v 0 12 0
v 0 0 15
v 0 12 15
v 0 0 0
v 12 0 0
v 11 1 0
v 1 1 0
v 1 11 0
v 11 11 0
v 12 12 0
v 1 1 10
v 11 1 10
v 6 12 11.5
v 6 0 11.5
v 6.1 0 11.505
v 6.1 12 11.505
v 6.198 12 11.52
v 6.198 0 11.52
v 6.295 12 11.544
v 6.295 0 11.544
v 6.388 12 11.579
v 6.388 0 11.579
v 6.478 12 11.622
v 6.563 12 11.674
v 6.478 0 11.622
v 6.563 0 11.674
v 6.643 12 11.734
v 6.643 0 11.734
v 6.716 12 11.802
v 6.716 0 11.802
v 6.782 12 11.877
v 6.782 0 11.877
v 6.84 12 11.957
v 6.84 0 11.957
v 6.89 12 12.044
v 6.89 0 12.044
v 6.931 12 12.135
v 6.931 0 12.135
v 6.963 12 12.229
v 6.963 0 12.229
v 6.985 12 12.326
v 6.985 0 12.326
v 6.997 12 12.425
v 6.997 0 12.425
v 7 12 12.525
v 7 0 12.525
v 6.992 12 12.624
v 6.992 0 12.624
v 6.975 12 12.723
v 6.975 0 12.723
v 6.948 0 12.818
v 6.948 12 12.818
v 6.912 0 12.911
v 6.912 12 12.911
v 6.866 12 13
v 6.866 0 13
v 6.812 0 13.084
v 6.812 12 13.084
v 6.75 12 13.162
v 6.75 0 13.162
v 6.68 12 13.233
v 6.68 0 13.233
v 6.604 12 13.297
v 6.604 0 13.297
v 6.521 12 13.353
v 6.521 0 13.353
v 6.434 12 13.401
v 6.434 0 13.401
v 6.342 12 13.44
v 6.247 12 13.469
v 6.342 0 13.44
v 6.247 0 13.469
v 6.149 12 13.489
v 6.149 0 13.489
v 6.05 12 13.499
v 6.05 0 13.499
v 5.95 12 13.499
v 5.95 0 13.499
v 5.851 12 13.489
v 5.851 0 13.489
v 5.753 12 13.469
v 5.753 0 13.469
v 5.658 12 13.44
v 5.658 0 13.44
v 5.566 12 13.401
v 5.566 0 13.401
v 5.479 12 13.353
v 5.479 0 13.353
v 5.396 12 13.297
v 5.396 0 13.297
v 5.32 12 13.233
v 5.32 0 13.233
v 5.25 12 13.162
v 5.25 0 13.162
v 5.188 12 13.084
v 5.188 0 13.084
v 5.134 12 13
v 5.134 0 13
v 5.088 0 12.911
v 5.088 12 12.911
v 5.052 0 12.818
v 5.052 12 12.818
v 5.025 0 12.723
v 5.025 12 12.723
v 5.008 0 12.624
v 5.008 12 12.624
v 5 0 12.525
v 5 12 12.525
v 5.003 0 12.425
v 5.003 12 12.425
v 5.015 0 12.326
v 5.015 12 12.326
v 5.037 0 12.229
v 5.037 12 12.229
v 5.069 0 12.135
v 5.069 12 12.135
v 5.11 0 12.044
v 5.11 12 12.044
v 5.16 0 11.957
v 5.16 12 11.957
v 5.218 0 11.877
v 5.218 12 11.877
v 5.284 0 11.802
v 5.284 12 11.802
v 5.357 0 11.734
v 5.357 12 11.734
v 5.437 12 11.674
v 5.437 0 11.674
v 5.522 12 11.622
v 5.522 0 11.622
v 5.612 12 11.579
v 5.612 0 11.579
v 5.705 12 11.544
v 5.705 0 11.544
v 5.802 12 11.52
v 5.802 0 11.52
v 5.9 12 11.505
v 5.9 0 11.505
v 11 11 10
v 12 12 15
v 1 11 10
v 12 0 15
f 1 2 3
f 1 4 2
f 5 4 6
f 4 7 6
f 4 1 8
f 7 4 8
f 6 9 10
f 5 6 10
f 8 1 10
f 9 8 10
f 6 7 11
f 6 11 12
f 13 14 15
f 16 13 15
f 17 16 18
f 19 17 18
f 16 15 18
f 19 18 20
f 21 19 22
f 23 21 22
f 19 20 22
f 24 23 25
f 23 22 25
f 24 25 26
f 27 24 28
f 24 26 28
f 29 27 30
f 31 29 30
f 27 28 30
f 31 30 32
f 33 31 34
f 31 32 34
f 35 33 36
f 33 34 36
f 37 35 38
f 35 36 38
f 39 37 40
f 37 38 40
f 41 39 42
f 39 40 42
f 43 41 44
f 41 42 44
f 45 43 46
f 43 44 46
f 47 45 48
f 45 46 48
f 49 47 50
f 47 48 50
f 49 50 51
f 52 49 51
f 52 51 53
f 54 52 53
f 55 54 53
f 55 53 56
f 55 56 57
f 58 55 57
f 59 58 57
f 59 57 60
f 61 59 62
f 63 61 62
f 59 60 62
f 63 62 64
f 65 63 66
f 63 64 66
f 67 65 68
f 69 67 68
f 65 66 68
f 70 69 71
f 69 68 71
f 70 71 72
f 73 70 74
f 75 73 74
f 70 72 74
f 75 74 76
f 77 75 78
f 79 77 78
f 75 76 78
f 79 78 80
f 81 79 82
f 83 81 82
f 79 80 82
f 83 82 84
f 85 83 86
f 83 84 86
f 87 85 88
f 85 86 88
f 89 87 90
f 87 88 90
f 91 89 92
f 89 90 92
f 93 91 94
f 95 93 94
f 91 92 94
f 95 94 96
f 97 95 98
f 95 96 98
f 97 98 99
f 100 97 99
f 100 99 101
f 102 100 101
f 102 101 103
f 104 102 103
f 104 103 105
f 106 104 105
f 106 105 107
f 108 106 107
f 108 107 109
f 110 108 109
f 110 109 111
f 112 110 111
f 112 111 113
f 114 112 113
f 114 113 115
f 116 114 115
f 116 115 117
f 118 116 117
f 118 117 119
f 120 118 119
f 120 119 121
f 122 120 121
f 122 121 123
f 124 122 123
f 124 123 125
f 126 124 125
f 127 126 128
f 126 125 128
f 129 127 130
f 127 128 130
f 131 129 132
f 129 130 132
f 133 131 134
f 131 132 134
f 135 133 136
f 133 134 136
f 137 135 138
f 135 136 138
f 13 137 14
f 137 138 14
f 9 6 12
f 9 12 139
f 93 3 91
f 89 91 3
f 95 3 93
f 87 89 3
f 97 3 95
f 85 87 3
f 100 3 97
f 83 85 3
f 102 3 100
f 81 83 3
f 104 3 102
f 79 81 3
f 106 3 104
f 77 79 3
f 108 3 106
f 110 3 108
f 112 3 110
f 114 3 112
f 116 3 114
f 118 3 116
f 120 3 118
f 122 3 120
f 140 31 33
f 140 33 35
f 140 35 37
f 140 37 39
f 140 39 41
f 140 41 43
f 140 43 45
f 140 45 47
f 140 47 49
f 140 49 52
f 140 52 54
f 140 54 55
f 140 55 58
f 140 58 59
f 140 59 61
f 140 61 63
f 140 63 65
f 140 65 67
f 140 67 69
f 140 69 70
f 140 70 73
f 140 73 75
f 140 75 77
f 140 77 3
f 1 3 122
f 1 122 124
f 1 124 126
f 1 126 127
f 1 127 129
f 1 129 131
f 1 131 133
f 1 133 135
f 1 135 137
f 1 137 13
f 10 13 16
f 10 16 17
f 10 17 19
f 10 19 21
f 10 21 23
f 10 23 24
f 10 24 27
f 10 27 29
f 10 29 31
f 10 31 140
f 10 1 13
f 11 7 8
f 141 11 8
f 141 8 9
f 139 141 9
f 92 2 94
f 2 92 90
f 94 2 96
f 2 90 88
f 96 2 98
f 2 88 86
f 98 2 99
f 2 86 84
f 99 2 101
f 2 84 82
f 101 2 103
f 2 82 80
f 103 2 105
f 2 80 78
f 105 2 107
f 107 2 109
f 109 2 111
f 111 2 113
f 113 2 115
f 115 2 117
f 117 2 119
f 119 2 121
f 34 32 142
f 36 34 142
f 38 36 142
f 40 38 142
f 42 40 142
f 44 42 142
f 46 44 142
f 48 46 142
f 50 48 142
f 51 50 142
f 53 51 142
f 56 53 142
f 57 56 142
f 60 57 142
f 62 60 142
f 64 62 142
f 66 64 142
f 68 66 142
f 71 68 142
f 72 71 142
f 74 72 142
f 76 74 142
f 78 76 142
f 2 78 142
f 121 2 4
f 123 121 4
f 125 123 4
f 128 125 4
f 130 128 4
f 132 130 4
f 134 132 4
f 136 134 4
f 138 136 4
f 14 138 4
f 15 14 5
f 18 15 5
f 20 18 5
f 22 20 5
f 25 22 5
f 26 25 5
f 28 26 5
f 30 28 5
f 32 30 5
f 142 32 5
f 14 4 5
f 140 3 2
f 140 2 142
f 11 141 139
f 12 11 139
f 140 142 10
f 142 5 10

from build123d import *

# Parameters (mm, degrees)
SKETCH_1_W          = 12
SKETCH_1_H          = 12
SKETCH_1_W_2        = 10
SKETCH_1_H_2        = 10
EXTRUDE_1_DEPTH     = 10
SKETCH_2_W          = 12
SKETCH_2_H          = 12
EXTRUDE_2_DEPTH     = 5
SKETCH_3_R          = 1
CUT_EXTRUDE_3_DEPTH = 12


with BuildPart() as part:
    # 草图1 → 凸台-拉伸1 (new body)
    with BuildSketch(Plane.XY):
        with Locations((6, 6)):
            Rectangle(SKETCH_1_W, SKETCH_1_H)
        with Locations((6, 6)):
            Rectangle(SKETCH_1_W_2, SKETCH_1_H_2, mode=Mode.SUBTRACT)
    extrude(amount=EXTRUDE_1_DEPTH)

    # 草图2 → 凸台-拉伸2 (add)
    with BuildSketch(Plane.XY.offset(10)):
        with Locations((6, 6)):
            Rectangle(SKETCH_2_W, SKETCH_2_H)
    extrude(amount=EXTRUDE_2_DEPTH)

    # 草图3 → 切除-拉伸3 (cut)
    with BuildSketch(Plane(origin=(0, 0, 0), x_dir=(-1, 0, 0), z_dir=(0, -1, 0))):
        with Locations(Location((-6, -12.5, 0), (0, 0, 90))):
            Circle(SKETCH_3_R)
    extrude(amount=-CUT_EXTRUDE_3_DEPTH, mode=Mode.SUBTRACT)


solid = part.part
